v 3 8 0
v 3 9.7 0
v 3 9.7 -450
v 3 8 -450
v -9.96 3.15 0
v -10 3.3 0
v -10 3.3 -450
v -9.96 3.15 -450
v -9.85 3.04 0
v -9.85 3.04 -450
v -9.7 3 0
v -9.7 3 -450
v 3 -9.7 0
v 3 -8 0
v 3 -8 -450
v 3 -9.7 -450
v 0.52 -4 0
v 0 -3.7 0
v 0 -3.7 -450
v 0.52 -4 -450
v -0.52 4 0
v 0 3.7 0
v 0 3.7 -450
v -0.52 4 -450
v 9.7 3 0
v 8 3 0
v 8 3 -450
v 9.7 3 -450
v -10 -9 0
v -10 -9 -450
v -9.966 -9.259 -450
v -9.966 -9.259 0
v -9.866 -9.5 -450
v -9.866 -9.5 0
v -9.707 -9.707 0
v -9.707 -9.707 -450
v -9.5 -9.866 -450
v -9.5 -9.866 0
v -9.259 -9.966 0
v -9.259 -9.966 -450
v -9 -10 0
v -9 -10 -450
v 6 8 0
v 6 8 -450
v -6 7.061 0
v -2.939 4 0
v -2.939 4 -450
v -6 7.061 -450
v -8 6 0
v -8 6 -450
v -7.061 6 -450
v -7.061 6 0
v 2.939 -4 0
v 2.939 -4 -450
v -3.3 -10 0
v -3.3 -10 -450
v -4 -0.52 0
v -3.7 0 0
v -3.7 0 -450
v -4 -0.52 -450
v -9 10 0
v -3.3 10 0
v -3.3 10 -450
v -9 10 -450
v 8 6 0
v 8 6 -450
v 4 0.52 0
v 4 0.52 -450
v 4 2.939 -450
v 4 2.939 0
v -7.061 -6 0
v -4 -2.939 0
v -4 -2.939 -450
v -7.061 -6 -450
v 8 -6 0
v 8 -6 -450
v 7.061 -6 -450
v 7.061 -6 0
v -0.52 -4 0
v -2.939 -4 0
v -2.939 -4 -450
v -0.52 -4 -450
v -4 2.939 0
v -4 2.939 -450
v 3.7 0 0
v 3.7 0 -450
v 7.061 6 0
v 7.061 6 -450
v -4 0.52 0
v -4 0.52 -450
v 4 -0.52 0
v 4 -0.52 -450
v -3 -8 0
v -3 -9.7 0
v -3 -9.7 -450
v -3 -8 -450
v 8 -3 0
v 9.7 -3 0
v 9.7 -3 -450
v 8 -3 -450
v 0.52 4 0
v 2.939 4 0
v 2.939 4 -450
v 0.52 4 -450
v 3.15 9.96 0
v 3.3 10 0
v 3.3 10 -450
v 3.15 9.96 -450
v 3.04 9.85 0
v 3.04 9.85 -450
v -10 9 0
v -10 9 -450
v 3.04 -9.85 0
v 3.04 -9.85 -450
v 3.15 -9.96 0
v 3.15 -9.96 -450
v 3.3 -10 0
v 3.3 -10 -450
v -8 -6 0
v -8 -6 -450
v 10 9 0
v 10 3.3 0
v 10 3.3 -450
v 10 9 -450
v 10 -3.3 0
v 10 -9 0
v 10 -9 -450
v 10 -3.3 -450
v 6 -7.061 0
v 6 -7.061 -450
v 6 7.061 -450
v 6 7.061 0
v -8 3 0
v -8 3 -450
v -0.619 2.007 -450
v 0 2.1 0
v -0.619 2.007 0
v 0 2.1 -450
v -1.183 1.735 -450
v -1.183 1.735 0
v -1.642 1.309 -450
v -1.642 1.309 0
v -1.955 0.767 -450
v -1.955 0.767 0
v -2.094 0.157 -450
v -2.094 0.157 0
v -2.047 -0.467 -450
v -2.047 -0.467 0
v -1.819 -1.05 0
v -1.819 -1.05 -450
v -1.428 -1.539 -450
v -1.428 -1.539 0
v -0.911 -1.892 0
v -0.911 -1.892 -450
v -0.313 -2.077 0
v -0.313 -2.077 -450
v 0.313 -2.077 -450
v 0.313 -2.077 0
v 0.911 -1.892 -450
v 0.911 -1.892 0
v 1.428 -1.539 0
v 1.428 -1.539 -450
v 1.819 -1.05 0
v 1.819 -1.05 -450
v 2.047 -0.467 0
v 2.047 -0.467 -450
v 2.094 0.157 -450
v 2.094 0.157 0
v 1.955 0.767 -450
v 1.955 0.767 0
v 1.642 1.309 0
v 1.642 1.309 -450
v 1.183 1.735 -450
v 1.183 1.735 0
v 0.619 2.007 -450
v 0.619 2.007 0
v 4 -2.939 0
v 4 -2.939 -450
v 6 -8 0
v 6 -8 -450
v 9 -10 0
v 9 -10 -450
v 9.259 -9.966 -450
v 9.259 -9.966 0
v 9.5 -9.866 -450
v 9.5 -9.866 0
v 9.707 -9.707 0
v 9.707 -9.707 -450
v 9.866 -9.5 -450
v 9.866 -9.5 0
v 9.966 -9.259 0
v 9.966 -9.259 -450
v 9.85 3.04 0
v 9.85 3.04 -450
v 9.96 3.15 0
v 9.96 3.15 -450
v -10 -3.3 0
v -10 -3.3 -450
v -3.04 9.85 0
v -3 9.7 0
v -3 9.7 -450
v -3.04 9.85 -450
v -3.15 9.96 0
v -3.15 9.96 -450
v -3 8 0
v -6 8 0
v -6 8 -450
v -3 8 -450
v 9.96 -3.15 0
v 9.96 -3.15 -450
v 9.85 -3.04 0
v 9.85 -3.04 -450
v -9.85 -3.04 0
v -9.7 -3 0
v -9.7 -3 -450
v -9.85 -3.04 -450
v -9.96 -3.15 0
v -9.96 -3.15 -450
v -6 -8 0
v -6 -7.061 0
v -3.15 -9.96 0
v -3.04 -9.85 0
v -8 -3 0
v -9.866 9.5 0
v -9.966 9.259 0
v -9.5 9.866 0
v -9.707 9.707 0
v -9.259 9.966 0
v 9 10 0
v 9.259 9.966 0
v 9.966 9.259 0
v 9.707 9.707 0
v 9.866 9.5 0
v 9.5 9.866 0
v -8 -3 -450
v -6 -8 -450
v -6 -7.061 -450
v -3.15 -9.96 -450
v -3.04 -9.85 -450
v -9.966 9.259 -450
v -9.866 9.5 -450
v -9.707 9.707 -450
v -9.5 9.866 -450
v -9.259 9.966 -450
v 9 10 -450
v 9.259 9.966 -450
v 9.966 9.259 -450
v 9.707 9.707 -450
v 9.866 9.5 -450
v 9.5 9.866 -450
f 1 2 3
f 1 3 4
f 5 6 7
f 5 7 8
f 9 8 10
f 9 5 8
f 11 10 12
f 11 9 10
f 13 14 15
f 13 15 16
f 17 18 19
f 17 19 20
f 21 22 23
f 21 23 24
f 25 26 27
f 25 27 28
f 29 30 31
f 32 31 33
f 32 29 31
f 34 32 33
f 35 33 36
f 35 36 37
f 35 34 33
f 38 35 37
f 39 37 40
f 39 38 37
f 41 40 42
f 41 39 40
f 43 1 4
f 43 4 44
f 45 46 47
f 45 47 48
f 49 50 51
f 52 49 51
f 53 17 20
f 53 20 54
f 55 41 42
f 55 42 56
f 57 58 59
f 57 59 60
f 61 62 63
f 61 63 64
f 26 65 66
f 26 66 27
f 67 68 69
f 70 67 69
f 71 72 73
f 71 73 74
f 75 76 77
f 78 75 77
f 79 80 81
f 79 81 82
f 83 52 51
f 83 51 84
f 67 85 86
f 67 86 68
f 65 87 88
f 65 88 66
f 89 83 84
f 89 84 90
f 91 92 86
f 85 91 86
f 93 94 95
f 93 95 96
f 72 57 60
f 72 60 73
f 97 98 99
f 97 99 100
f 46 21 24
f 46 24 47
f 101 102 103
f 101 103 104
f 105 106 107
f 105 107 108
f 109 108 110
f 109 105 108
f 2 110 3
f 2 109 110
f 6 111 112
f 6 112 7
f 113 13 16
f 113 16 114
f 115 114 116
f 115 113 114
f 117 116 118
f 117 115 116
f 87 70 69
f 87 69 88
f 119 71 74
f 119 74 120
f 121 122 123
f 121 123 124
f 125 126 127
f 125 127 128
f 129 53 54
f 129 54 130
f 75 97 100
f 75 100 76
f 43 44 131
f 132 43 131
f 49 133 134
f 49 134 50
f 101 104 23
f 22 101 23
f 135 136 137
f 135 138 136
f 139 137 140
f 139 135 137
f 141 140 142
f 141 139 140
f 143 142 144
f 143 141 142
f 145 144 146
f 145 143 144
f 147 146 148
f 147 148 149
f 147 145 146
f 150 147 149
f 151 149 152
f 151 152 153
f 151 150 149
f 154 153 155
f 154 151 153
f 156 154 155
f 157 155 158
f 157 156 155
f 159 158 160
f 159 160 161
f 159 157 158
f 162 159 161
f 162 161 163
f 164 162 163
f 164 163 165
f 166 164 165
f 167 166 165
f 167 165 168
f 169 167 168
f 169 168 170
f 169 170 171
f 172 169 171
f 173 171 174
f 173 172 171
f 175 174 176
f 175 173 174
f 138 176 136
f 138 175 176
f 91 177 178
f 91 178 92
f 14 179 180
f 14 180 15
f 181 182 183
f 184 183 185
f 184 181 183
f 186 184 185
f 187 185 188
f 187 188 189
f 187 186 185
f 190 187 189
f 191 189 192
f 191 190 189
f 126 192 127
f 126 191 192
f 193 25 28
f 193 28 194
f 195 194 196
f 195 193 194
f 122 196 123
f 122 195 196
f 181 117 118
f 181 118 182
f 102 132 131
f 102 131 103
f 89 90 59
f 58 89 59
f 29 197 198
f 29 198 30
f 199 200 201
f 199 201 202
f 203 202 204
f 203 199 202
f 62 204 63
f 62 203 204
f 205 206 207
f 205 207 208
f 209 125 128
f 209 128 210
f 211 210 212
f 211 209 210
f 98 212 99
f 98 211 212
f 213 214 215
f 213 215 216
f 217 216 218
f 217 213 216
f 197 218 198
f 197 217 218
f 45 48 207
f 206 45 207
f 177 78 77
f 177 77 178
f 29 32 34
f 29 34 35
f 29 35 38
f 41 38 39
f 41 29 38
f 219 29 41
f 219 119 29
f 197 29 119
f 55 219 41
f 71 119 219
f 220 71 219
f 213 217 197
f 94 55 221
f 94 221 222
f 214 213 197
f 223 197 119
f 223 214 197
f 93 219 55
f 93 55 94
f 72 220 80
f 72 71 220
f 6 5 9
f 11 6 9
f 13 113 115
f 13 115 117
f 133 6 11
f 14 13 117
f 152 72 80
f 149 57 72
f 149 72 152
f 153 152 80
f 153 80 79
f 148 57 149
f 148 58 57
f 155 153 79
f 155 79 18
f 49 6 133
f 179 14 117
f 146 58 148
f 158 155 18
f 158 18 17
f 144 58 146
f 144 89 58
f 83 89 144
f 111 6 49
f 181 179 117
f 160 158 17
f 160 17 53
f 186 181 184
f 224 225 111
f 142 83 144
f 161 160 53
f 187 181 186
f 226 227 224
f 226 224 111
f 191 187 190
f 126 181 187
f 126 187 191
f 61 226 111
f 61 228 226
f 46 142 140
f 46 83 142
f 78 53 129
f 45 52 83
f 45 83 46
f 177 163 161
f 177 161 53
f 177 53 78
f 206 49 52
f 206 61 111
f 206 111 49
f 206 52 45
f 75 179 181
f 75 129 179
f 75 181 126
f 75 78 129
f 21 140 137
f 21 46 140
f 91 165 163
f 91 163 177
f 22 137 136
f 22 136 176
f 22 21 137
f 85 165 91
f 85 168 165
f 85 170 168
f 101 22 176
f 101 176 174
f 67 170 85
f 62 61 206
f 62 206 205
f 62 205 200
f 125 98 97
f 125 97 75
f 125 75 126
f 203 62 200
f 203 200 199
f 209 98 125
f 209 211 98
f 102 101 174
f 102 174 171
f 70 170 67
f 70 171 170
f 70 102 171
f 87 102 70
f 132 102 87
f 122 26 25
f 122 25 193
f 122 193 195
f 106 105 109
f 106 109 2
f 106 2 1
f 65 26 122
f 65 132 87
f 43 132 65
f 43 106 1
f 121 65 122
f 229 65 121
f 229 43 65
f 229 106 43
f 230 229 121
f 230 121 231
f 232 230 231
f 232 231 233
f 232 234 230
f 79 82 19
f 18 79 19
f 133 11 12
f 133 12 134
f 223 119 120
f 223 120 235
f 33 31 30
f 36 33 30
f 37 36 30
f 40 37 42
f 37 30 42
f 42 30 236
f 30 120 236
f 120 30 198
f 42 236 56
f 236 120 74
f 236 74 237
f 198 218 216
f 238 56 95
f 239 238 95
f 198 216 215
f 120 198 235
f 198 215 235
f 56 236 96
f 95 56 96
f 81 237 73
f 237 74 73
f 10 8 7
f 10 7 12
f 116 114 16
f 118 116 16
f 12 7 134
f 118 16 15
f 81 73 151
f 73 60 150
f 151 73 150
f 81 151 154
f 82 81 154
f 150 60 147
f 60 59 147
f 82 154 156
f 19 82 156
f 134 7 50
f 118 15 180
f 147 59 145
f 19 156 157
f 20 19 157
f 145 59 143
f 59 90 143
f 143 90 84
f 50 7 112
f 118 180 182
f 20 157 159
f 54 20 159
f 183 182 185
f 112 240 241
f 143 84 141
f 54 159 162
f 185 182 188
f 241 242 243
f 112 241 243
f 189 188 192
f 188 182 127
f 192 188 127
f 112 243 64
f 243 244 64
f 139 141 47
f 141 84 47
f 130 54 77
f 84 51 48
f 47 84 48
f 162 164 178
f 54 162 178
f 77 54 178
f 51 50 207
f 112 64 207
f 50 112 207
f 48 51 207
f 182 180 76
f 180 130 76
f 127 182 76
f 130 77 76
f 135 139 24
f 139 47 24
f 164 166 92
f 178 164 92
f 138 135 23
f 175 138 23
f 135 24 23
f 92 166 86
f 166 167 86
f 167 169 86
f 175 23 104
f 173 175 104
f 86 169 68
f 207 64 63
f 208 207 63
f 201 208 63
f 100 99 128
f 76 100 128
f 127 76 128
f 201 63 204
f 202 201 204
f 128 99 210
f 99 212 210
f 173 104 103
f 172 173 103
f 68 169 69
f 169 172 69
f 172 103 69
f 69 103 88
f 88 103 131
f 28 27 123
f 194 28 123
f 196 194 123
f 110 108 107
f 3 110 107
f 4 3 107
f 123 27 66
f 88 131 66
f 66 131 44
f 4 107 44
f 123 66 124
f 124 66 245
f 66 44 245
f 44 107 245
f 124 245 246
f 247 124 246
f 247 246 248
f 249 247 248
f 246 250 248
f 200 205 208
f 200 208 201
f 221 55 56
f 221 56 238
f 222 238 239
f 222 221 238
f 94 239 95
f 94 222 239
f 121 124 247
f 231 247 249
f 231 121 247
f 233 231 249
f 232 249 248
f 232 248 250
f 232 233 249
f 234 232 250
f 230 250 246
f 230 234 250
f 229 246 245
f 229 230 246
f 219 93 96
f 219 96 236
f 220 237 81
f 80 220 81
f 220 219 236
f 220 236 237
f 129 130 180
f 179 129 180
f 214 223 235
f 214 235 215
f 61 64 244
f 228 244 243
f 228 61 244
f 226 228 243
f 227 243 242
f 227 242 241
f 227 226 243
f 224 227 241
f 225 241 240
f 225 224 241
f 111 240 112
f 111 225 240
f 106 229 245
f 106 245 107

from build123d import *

# Parameters (mm, degrees)
BOSS_EXTRUDE1_DEPTH = 450
SKETCH2_W           = 450
SKETCH2_H           = 2.1


with BuildPart() as part:
    # Sketch1 → Boss-Extrude1 (new body)
    with BuildSketch(Plane.XY):
        with BuildLine():
            Line((-10, 9), (-10, 3.29999995))
            ThreePointArc((-10, 3.29999995), (-9.912132049, 3.087867916), (-9.7, 3))
            Line((-9.7, 3), (-8, 3))
            Line((-8, 3), (-8, 6))
            Line((-8, 6), (-7.060677, 6))
            Line((-7.060677, 6), (-4, 2.93932965))
            Line((-4, 2.93932965), (-4, 0.519615242))
            Line((-4, 0.519615242), (-3.699996283, -6.437e-06))
            Line((-3.699996283, -6.437e-06), (-4, -0.519628117))
            Line((-4, -0.519628117), (-4, -2.93933725))
            Line((-4, -2.93933725), (-7.0606695, -6))
            Line((-7.0606695, -6), (-8, -6))
            Line((-8, -6), (-8, -3))
            Line((-8, -3), (-9.7, -3))
            ThreePointArc((-9.7, -3), (-9.912132049, -3.087867916), (-10, -3.29999995))
            Line((-10, -3.29999995), (-10, -9))
            ThreePointArc((-10, -9), (-9.707106781, -9.707106781), (-9, -10))
            Line((-9, -10), (-3.29999995, -10))
            ThreePointArc((-3.29999995, -10), (-3.087867916, -9.912132049), (-3, -9.7))
            Line((-3, -9.7), (-3, -8))
            Line((-3, -8), (-6, -8))
            Line((-6, -8), (-6, -7.0606515))
            Line((-6, -7.0606515), (-2.9393489, -4))
            Line((-2.9393489, -4), (-0.519615242, -4))
            Line((-0.519615242, -4), (6.437e-06, -3.699996283))
            Line((6.437e-06, -3.699996283), (0.519628117, -4))
            Line((0.519628117, -4), (2.9393227, -4))
            Line((2.9393227, -4), (6, -7.060677))
            Line((6, -7.060677), (6, -8))
            Line((6, -8), (3, -8))
            Line((3, -8), (3, -9.7))
            ThreePointArc((3, -9.7), (3.087867916, -9.912132049), (3.29999995, -10))
            Line((3.29999995, -10), (9, -10))
            ThreePointArc((9, -10), (9.707106781, -9.707106781), (10, -9))
            Line((10, -9), (10, -3.29999995))
            ThreePointArc((10, -3.29999995), (9.912132049, -3.087867916), (9.7, -3))
            Line((9.7, -3), (8, -3))
            Line((8, -3), (8, -6))
            Line((8, -6), (7.0606435, -6))
            Line((7.0606435, -6), (4, -2.9393482))
            Line((4, -2.9393482), (4, -0.519615242))
            Line((4, -0.519615242), (3.699996283, 6.437e-06))
            Line((3.699996283, 6.437e-06), (4, 0.519628117))
            Line((4, 0.519628117), (4, 2.9393401))
            Line((4, 2.9393401), (7.060651, 6))
            Line((7.060651, 6), (8, 6))
            Line((8, 6), (8, 3))
            Line((8, 3), (9.7, 3))
            ThreePointArc((9.7, 3), (9.912132049, 3.087867916), (10, 3.29999995))
            Line((10, 3.29999995), (10, 9))
            ThreePointArc((10, 9), (9.707106781, 9.707106781), (9, 10))
            Line((9, 10), (3.29999995, 10))
            ThreePointArc((3.29999995, 10), (3.087867916, 9.912132049), (3, 9.7))
            Line((3, 9.7), (3, 8))
            Line((3, 8), (6, 8))
            Line((6, 8), (6, 7.060669))
            Line((6, 7.060669), (2.9393308, 4))
            Line((2.9393308, 4), (0.519615242, 4))
            Line((0.519615242, 4), (-6.437e-06, 3.699996283))
            Line((-6.437e-06, 3.699996283), (-0.519628117, 4))
            Line((-0.519628117, 4), (-2.93935655, 4))
            Line((-2.93935655, 4), (-6, 7.0606435))
            Line((-6, 7.0606435), (-6, 8))
            Line((-6, 8), (-3, 8))
            Line((-3, 8), (-3, 9.7))
            ThreePointArc((-3, 9.7), (-3.087867966, 9.912132034), (-3.3, 10))
            Line((-3.3, 10), (-9, 10))
            ThreePointArc((-9, 10), (-9.707106781, 9.707106781), (-10, 9))
        make_face()
    extrude(amount=-BOSS_EXTRUDE1_DEPTH)

    # Sketch2 → Cut-Revolve1 (revolve, cut)
    with BuildSketch(Plane(origin=(0, 0, 0), x_dir=(0, 0, -1), z_dir=(1, 0, 0))):
        with Locations((225, 1.05)):
            Rectangle(SKETCH2_W, SKETCH2_H)
    revolve(axis=Axis((0, 0, -450), (0, 0, 1)), mode=Mode.SUBTRACT)


solid = part.part
